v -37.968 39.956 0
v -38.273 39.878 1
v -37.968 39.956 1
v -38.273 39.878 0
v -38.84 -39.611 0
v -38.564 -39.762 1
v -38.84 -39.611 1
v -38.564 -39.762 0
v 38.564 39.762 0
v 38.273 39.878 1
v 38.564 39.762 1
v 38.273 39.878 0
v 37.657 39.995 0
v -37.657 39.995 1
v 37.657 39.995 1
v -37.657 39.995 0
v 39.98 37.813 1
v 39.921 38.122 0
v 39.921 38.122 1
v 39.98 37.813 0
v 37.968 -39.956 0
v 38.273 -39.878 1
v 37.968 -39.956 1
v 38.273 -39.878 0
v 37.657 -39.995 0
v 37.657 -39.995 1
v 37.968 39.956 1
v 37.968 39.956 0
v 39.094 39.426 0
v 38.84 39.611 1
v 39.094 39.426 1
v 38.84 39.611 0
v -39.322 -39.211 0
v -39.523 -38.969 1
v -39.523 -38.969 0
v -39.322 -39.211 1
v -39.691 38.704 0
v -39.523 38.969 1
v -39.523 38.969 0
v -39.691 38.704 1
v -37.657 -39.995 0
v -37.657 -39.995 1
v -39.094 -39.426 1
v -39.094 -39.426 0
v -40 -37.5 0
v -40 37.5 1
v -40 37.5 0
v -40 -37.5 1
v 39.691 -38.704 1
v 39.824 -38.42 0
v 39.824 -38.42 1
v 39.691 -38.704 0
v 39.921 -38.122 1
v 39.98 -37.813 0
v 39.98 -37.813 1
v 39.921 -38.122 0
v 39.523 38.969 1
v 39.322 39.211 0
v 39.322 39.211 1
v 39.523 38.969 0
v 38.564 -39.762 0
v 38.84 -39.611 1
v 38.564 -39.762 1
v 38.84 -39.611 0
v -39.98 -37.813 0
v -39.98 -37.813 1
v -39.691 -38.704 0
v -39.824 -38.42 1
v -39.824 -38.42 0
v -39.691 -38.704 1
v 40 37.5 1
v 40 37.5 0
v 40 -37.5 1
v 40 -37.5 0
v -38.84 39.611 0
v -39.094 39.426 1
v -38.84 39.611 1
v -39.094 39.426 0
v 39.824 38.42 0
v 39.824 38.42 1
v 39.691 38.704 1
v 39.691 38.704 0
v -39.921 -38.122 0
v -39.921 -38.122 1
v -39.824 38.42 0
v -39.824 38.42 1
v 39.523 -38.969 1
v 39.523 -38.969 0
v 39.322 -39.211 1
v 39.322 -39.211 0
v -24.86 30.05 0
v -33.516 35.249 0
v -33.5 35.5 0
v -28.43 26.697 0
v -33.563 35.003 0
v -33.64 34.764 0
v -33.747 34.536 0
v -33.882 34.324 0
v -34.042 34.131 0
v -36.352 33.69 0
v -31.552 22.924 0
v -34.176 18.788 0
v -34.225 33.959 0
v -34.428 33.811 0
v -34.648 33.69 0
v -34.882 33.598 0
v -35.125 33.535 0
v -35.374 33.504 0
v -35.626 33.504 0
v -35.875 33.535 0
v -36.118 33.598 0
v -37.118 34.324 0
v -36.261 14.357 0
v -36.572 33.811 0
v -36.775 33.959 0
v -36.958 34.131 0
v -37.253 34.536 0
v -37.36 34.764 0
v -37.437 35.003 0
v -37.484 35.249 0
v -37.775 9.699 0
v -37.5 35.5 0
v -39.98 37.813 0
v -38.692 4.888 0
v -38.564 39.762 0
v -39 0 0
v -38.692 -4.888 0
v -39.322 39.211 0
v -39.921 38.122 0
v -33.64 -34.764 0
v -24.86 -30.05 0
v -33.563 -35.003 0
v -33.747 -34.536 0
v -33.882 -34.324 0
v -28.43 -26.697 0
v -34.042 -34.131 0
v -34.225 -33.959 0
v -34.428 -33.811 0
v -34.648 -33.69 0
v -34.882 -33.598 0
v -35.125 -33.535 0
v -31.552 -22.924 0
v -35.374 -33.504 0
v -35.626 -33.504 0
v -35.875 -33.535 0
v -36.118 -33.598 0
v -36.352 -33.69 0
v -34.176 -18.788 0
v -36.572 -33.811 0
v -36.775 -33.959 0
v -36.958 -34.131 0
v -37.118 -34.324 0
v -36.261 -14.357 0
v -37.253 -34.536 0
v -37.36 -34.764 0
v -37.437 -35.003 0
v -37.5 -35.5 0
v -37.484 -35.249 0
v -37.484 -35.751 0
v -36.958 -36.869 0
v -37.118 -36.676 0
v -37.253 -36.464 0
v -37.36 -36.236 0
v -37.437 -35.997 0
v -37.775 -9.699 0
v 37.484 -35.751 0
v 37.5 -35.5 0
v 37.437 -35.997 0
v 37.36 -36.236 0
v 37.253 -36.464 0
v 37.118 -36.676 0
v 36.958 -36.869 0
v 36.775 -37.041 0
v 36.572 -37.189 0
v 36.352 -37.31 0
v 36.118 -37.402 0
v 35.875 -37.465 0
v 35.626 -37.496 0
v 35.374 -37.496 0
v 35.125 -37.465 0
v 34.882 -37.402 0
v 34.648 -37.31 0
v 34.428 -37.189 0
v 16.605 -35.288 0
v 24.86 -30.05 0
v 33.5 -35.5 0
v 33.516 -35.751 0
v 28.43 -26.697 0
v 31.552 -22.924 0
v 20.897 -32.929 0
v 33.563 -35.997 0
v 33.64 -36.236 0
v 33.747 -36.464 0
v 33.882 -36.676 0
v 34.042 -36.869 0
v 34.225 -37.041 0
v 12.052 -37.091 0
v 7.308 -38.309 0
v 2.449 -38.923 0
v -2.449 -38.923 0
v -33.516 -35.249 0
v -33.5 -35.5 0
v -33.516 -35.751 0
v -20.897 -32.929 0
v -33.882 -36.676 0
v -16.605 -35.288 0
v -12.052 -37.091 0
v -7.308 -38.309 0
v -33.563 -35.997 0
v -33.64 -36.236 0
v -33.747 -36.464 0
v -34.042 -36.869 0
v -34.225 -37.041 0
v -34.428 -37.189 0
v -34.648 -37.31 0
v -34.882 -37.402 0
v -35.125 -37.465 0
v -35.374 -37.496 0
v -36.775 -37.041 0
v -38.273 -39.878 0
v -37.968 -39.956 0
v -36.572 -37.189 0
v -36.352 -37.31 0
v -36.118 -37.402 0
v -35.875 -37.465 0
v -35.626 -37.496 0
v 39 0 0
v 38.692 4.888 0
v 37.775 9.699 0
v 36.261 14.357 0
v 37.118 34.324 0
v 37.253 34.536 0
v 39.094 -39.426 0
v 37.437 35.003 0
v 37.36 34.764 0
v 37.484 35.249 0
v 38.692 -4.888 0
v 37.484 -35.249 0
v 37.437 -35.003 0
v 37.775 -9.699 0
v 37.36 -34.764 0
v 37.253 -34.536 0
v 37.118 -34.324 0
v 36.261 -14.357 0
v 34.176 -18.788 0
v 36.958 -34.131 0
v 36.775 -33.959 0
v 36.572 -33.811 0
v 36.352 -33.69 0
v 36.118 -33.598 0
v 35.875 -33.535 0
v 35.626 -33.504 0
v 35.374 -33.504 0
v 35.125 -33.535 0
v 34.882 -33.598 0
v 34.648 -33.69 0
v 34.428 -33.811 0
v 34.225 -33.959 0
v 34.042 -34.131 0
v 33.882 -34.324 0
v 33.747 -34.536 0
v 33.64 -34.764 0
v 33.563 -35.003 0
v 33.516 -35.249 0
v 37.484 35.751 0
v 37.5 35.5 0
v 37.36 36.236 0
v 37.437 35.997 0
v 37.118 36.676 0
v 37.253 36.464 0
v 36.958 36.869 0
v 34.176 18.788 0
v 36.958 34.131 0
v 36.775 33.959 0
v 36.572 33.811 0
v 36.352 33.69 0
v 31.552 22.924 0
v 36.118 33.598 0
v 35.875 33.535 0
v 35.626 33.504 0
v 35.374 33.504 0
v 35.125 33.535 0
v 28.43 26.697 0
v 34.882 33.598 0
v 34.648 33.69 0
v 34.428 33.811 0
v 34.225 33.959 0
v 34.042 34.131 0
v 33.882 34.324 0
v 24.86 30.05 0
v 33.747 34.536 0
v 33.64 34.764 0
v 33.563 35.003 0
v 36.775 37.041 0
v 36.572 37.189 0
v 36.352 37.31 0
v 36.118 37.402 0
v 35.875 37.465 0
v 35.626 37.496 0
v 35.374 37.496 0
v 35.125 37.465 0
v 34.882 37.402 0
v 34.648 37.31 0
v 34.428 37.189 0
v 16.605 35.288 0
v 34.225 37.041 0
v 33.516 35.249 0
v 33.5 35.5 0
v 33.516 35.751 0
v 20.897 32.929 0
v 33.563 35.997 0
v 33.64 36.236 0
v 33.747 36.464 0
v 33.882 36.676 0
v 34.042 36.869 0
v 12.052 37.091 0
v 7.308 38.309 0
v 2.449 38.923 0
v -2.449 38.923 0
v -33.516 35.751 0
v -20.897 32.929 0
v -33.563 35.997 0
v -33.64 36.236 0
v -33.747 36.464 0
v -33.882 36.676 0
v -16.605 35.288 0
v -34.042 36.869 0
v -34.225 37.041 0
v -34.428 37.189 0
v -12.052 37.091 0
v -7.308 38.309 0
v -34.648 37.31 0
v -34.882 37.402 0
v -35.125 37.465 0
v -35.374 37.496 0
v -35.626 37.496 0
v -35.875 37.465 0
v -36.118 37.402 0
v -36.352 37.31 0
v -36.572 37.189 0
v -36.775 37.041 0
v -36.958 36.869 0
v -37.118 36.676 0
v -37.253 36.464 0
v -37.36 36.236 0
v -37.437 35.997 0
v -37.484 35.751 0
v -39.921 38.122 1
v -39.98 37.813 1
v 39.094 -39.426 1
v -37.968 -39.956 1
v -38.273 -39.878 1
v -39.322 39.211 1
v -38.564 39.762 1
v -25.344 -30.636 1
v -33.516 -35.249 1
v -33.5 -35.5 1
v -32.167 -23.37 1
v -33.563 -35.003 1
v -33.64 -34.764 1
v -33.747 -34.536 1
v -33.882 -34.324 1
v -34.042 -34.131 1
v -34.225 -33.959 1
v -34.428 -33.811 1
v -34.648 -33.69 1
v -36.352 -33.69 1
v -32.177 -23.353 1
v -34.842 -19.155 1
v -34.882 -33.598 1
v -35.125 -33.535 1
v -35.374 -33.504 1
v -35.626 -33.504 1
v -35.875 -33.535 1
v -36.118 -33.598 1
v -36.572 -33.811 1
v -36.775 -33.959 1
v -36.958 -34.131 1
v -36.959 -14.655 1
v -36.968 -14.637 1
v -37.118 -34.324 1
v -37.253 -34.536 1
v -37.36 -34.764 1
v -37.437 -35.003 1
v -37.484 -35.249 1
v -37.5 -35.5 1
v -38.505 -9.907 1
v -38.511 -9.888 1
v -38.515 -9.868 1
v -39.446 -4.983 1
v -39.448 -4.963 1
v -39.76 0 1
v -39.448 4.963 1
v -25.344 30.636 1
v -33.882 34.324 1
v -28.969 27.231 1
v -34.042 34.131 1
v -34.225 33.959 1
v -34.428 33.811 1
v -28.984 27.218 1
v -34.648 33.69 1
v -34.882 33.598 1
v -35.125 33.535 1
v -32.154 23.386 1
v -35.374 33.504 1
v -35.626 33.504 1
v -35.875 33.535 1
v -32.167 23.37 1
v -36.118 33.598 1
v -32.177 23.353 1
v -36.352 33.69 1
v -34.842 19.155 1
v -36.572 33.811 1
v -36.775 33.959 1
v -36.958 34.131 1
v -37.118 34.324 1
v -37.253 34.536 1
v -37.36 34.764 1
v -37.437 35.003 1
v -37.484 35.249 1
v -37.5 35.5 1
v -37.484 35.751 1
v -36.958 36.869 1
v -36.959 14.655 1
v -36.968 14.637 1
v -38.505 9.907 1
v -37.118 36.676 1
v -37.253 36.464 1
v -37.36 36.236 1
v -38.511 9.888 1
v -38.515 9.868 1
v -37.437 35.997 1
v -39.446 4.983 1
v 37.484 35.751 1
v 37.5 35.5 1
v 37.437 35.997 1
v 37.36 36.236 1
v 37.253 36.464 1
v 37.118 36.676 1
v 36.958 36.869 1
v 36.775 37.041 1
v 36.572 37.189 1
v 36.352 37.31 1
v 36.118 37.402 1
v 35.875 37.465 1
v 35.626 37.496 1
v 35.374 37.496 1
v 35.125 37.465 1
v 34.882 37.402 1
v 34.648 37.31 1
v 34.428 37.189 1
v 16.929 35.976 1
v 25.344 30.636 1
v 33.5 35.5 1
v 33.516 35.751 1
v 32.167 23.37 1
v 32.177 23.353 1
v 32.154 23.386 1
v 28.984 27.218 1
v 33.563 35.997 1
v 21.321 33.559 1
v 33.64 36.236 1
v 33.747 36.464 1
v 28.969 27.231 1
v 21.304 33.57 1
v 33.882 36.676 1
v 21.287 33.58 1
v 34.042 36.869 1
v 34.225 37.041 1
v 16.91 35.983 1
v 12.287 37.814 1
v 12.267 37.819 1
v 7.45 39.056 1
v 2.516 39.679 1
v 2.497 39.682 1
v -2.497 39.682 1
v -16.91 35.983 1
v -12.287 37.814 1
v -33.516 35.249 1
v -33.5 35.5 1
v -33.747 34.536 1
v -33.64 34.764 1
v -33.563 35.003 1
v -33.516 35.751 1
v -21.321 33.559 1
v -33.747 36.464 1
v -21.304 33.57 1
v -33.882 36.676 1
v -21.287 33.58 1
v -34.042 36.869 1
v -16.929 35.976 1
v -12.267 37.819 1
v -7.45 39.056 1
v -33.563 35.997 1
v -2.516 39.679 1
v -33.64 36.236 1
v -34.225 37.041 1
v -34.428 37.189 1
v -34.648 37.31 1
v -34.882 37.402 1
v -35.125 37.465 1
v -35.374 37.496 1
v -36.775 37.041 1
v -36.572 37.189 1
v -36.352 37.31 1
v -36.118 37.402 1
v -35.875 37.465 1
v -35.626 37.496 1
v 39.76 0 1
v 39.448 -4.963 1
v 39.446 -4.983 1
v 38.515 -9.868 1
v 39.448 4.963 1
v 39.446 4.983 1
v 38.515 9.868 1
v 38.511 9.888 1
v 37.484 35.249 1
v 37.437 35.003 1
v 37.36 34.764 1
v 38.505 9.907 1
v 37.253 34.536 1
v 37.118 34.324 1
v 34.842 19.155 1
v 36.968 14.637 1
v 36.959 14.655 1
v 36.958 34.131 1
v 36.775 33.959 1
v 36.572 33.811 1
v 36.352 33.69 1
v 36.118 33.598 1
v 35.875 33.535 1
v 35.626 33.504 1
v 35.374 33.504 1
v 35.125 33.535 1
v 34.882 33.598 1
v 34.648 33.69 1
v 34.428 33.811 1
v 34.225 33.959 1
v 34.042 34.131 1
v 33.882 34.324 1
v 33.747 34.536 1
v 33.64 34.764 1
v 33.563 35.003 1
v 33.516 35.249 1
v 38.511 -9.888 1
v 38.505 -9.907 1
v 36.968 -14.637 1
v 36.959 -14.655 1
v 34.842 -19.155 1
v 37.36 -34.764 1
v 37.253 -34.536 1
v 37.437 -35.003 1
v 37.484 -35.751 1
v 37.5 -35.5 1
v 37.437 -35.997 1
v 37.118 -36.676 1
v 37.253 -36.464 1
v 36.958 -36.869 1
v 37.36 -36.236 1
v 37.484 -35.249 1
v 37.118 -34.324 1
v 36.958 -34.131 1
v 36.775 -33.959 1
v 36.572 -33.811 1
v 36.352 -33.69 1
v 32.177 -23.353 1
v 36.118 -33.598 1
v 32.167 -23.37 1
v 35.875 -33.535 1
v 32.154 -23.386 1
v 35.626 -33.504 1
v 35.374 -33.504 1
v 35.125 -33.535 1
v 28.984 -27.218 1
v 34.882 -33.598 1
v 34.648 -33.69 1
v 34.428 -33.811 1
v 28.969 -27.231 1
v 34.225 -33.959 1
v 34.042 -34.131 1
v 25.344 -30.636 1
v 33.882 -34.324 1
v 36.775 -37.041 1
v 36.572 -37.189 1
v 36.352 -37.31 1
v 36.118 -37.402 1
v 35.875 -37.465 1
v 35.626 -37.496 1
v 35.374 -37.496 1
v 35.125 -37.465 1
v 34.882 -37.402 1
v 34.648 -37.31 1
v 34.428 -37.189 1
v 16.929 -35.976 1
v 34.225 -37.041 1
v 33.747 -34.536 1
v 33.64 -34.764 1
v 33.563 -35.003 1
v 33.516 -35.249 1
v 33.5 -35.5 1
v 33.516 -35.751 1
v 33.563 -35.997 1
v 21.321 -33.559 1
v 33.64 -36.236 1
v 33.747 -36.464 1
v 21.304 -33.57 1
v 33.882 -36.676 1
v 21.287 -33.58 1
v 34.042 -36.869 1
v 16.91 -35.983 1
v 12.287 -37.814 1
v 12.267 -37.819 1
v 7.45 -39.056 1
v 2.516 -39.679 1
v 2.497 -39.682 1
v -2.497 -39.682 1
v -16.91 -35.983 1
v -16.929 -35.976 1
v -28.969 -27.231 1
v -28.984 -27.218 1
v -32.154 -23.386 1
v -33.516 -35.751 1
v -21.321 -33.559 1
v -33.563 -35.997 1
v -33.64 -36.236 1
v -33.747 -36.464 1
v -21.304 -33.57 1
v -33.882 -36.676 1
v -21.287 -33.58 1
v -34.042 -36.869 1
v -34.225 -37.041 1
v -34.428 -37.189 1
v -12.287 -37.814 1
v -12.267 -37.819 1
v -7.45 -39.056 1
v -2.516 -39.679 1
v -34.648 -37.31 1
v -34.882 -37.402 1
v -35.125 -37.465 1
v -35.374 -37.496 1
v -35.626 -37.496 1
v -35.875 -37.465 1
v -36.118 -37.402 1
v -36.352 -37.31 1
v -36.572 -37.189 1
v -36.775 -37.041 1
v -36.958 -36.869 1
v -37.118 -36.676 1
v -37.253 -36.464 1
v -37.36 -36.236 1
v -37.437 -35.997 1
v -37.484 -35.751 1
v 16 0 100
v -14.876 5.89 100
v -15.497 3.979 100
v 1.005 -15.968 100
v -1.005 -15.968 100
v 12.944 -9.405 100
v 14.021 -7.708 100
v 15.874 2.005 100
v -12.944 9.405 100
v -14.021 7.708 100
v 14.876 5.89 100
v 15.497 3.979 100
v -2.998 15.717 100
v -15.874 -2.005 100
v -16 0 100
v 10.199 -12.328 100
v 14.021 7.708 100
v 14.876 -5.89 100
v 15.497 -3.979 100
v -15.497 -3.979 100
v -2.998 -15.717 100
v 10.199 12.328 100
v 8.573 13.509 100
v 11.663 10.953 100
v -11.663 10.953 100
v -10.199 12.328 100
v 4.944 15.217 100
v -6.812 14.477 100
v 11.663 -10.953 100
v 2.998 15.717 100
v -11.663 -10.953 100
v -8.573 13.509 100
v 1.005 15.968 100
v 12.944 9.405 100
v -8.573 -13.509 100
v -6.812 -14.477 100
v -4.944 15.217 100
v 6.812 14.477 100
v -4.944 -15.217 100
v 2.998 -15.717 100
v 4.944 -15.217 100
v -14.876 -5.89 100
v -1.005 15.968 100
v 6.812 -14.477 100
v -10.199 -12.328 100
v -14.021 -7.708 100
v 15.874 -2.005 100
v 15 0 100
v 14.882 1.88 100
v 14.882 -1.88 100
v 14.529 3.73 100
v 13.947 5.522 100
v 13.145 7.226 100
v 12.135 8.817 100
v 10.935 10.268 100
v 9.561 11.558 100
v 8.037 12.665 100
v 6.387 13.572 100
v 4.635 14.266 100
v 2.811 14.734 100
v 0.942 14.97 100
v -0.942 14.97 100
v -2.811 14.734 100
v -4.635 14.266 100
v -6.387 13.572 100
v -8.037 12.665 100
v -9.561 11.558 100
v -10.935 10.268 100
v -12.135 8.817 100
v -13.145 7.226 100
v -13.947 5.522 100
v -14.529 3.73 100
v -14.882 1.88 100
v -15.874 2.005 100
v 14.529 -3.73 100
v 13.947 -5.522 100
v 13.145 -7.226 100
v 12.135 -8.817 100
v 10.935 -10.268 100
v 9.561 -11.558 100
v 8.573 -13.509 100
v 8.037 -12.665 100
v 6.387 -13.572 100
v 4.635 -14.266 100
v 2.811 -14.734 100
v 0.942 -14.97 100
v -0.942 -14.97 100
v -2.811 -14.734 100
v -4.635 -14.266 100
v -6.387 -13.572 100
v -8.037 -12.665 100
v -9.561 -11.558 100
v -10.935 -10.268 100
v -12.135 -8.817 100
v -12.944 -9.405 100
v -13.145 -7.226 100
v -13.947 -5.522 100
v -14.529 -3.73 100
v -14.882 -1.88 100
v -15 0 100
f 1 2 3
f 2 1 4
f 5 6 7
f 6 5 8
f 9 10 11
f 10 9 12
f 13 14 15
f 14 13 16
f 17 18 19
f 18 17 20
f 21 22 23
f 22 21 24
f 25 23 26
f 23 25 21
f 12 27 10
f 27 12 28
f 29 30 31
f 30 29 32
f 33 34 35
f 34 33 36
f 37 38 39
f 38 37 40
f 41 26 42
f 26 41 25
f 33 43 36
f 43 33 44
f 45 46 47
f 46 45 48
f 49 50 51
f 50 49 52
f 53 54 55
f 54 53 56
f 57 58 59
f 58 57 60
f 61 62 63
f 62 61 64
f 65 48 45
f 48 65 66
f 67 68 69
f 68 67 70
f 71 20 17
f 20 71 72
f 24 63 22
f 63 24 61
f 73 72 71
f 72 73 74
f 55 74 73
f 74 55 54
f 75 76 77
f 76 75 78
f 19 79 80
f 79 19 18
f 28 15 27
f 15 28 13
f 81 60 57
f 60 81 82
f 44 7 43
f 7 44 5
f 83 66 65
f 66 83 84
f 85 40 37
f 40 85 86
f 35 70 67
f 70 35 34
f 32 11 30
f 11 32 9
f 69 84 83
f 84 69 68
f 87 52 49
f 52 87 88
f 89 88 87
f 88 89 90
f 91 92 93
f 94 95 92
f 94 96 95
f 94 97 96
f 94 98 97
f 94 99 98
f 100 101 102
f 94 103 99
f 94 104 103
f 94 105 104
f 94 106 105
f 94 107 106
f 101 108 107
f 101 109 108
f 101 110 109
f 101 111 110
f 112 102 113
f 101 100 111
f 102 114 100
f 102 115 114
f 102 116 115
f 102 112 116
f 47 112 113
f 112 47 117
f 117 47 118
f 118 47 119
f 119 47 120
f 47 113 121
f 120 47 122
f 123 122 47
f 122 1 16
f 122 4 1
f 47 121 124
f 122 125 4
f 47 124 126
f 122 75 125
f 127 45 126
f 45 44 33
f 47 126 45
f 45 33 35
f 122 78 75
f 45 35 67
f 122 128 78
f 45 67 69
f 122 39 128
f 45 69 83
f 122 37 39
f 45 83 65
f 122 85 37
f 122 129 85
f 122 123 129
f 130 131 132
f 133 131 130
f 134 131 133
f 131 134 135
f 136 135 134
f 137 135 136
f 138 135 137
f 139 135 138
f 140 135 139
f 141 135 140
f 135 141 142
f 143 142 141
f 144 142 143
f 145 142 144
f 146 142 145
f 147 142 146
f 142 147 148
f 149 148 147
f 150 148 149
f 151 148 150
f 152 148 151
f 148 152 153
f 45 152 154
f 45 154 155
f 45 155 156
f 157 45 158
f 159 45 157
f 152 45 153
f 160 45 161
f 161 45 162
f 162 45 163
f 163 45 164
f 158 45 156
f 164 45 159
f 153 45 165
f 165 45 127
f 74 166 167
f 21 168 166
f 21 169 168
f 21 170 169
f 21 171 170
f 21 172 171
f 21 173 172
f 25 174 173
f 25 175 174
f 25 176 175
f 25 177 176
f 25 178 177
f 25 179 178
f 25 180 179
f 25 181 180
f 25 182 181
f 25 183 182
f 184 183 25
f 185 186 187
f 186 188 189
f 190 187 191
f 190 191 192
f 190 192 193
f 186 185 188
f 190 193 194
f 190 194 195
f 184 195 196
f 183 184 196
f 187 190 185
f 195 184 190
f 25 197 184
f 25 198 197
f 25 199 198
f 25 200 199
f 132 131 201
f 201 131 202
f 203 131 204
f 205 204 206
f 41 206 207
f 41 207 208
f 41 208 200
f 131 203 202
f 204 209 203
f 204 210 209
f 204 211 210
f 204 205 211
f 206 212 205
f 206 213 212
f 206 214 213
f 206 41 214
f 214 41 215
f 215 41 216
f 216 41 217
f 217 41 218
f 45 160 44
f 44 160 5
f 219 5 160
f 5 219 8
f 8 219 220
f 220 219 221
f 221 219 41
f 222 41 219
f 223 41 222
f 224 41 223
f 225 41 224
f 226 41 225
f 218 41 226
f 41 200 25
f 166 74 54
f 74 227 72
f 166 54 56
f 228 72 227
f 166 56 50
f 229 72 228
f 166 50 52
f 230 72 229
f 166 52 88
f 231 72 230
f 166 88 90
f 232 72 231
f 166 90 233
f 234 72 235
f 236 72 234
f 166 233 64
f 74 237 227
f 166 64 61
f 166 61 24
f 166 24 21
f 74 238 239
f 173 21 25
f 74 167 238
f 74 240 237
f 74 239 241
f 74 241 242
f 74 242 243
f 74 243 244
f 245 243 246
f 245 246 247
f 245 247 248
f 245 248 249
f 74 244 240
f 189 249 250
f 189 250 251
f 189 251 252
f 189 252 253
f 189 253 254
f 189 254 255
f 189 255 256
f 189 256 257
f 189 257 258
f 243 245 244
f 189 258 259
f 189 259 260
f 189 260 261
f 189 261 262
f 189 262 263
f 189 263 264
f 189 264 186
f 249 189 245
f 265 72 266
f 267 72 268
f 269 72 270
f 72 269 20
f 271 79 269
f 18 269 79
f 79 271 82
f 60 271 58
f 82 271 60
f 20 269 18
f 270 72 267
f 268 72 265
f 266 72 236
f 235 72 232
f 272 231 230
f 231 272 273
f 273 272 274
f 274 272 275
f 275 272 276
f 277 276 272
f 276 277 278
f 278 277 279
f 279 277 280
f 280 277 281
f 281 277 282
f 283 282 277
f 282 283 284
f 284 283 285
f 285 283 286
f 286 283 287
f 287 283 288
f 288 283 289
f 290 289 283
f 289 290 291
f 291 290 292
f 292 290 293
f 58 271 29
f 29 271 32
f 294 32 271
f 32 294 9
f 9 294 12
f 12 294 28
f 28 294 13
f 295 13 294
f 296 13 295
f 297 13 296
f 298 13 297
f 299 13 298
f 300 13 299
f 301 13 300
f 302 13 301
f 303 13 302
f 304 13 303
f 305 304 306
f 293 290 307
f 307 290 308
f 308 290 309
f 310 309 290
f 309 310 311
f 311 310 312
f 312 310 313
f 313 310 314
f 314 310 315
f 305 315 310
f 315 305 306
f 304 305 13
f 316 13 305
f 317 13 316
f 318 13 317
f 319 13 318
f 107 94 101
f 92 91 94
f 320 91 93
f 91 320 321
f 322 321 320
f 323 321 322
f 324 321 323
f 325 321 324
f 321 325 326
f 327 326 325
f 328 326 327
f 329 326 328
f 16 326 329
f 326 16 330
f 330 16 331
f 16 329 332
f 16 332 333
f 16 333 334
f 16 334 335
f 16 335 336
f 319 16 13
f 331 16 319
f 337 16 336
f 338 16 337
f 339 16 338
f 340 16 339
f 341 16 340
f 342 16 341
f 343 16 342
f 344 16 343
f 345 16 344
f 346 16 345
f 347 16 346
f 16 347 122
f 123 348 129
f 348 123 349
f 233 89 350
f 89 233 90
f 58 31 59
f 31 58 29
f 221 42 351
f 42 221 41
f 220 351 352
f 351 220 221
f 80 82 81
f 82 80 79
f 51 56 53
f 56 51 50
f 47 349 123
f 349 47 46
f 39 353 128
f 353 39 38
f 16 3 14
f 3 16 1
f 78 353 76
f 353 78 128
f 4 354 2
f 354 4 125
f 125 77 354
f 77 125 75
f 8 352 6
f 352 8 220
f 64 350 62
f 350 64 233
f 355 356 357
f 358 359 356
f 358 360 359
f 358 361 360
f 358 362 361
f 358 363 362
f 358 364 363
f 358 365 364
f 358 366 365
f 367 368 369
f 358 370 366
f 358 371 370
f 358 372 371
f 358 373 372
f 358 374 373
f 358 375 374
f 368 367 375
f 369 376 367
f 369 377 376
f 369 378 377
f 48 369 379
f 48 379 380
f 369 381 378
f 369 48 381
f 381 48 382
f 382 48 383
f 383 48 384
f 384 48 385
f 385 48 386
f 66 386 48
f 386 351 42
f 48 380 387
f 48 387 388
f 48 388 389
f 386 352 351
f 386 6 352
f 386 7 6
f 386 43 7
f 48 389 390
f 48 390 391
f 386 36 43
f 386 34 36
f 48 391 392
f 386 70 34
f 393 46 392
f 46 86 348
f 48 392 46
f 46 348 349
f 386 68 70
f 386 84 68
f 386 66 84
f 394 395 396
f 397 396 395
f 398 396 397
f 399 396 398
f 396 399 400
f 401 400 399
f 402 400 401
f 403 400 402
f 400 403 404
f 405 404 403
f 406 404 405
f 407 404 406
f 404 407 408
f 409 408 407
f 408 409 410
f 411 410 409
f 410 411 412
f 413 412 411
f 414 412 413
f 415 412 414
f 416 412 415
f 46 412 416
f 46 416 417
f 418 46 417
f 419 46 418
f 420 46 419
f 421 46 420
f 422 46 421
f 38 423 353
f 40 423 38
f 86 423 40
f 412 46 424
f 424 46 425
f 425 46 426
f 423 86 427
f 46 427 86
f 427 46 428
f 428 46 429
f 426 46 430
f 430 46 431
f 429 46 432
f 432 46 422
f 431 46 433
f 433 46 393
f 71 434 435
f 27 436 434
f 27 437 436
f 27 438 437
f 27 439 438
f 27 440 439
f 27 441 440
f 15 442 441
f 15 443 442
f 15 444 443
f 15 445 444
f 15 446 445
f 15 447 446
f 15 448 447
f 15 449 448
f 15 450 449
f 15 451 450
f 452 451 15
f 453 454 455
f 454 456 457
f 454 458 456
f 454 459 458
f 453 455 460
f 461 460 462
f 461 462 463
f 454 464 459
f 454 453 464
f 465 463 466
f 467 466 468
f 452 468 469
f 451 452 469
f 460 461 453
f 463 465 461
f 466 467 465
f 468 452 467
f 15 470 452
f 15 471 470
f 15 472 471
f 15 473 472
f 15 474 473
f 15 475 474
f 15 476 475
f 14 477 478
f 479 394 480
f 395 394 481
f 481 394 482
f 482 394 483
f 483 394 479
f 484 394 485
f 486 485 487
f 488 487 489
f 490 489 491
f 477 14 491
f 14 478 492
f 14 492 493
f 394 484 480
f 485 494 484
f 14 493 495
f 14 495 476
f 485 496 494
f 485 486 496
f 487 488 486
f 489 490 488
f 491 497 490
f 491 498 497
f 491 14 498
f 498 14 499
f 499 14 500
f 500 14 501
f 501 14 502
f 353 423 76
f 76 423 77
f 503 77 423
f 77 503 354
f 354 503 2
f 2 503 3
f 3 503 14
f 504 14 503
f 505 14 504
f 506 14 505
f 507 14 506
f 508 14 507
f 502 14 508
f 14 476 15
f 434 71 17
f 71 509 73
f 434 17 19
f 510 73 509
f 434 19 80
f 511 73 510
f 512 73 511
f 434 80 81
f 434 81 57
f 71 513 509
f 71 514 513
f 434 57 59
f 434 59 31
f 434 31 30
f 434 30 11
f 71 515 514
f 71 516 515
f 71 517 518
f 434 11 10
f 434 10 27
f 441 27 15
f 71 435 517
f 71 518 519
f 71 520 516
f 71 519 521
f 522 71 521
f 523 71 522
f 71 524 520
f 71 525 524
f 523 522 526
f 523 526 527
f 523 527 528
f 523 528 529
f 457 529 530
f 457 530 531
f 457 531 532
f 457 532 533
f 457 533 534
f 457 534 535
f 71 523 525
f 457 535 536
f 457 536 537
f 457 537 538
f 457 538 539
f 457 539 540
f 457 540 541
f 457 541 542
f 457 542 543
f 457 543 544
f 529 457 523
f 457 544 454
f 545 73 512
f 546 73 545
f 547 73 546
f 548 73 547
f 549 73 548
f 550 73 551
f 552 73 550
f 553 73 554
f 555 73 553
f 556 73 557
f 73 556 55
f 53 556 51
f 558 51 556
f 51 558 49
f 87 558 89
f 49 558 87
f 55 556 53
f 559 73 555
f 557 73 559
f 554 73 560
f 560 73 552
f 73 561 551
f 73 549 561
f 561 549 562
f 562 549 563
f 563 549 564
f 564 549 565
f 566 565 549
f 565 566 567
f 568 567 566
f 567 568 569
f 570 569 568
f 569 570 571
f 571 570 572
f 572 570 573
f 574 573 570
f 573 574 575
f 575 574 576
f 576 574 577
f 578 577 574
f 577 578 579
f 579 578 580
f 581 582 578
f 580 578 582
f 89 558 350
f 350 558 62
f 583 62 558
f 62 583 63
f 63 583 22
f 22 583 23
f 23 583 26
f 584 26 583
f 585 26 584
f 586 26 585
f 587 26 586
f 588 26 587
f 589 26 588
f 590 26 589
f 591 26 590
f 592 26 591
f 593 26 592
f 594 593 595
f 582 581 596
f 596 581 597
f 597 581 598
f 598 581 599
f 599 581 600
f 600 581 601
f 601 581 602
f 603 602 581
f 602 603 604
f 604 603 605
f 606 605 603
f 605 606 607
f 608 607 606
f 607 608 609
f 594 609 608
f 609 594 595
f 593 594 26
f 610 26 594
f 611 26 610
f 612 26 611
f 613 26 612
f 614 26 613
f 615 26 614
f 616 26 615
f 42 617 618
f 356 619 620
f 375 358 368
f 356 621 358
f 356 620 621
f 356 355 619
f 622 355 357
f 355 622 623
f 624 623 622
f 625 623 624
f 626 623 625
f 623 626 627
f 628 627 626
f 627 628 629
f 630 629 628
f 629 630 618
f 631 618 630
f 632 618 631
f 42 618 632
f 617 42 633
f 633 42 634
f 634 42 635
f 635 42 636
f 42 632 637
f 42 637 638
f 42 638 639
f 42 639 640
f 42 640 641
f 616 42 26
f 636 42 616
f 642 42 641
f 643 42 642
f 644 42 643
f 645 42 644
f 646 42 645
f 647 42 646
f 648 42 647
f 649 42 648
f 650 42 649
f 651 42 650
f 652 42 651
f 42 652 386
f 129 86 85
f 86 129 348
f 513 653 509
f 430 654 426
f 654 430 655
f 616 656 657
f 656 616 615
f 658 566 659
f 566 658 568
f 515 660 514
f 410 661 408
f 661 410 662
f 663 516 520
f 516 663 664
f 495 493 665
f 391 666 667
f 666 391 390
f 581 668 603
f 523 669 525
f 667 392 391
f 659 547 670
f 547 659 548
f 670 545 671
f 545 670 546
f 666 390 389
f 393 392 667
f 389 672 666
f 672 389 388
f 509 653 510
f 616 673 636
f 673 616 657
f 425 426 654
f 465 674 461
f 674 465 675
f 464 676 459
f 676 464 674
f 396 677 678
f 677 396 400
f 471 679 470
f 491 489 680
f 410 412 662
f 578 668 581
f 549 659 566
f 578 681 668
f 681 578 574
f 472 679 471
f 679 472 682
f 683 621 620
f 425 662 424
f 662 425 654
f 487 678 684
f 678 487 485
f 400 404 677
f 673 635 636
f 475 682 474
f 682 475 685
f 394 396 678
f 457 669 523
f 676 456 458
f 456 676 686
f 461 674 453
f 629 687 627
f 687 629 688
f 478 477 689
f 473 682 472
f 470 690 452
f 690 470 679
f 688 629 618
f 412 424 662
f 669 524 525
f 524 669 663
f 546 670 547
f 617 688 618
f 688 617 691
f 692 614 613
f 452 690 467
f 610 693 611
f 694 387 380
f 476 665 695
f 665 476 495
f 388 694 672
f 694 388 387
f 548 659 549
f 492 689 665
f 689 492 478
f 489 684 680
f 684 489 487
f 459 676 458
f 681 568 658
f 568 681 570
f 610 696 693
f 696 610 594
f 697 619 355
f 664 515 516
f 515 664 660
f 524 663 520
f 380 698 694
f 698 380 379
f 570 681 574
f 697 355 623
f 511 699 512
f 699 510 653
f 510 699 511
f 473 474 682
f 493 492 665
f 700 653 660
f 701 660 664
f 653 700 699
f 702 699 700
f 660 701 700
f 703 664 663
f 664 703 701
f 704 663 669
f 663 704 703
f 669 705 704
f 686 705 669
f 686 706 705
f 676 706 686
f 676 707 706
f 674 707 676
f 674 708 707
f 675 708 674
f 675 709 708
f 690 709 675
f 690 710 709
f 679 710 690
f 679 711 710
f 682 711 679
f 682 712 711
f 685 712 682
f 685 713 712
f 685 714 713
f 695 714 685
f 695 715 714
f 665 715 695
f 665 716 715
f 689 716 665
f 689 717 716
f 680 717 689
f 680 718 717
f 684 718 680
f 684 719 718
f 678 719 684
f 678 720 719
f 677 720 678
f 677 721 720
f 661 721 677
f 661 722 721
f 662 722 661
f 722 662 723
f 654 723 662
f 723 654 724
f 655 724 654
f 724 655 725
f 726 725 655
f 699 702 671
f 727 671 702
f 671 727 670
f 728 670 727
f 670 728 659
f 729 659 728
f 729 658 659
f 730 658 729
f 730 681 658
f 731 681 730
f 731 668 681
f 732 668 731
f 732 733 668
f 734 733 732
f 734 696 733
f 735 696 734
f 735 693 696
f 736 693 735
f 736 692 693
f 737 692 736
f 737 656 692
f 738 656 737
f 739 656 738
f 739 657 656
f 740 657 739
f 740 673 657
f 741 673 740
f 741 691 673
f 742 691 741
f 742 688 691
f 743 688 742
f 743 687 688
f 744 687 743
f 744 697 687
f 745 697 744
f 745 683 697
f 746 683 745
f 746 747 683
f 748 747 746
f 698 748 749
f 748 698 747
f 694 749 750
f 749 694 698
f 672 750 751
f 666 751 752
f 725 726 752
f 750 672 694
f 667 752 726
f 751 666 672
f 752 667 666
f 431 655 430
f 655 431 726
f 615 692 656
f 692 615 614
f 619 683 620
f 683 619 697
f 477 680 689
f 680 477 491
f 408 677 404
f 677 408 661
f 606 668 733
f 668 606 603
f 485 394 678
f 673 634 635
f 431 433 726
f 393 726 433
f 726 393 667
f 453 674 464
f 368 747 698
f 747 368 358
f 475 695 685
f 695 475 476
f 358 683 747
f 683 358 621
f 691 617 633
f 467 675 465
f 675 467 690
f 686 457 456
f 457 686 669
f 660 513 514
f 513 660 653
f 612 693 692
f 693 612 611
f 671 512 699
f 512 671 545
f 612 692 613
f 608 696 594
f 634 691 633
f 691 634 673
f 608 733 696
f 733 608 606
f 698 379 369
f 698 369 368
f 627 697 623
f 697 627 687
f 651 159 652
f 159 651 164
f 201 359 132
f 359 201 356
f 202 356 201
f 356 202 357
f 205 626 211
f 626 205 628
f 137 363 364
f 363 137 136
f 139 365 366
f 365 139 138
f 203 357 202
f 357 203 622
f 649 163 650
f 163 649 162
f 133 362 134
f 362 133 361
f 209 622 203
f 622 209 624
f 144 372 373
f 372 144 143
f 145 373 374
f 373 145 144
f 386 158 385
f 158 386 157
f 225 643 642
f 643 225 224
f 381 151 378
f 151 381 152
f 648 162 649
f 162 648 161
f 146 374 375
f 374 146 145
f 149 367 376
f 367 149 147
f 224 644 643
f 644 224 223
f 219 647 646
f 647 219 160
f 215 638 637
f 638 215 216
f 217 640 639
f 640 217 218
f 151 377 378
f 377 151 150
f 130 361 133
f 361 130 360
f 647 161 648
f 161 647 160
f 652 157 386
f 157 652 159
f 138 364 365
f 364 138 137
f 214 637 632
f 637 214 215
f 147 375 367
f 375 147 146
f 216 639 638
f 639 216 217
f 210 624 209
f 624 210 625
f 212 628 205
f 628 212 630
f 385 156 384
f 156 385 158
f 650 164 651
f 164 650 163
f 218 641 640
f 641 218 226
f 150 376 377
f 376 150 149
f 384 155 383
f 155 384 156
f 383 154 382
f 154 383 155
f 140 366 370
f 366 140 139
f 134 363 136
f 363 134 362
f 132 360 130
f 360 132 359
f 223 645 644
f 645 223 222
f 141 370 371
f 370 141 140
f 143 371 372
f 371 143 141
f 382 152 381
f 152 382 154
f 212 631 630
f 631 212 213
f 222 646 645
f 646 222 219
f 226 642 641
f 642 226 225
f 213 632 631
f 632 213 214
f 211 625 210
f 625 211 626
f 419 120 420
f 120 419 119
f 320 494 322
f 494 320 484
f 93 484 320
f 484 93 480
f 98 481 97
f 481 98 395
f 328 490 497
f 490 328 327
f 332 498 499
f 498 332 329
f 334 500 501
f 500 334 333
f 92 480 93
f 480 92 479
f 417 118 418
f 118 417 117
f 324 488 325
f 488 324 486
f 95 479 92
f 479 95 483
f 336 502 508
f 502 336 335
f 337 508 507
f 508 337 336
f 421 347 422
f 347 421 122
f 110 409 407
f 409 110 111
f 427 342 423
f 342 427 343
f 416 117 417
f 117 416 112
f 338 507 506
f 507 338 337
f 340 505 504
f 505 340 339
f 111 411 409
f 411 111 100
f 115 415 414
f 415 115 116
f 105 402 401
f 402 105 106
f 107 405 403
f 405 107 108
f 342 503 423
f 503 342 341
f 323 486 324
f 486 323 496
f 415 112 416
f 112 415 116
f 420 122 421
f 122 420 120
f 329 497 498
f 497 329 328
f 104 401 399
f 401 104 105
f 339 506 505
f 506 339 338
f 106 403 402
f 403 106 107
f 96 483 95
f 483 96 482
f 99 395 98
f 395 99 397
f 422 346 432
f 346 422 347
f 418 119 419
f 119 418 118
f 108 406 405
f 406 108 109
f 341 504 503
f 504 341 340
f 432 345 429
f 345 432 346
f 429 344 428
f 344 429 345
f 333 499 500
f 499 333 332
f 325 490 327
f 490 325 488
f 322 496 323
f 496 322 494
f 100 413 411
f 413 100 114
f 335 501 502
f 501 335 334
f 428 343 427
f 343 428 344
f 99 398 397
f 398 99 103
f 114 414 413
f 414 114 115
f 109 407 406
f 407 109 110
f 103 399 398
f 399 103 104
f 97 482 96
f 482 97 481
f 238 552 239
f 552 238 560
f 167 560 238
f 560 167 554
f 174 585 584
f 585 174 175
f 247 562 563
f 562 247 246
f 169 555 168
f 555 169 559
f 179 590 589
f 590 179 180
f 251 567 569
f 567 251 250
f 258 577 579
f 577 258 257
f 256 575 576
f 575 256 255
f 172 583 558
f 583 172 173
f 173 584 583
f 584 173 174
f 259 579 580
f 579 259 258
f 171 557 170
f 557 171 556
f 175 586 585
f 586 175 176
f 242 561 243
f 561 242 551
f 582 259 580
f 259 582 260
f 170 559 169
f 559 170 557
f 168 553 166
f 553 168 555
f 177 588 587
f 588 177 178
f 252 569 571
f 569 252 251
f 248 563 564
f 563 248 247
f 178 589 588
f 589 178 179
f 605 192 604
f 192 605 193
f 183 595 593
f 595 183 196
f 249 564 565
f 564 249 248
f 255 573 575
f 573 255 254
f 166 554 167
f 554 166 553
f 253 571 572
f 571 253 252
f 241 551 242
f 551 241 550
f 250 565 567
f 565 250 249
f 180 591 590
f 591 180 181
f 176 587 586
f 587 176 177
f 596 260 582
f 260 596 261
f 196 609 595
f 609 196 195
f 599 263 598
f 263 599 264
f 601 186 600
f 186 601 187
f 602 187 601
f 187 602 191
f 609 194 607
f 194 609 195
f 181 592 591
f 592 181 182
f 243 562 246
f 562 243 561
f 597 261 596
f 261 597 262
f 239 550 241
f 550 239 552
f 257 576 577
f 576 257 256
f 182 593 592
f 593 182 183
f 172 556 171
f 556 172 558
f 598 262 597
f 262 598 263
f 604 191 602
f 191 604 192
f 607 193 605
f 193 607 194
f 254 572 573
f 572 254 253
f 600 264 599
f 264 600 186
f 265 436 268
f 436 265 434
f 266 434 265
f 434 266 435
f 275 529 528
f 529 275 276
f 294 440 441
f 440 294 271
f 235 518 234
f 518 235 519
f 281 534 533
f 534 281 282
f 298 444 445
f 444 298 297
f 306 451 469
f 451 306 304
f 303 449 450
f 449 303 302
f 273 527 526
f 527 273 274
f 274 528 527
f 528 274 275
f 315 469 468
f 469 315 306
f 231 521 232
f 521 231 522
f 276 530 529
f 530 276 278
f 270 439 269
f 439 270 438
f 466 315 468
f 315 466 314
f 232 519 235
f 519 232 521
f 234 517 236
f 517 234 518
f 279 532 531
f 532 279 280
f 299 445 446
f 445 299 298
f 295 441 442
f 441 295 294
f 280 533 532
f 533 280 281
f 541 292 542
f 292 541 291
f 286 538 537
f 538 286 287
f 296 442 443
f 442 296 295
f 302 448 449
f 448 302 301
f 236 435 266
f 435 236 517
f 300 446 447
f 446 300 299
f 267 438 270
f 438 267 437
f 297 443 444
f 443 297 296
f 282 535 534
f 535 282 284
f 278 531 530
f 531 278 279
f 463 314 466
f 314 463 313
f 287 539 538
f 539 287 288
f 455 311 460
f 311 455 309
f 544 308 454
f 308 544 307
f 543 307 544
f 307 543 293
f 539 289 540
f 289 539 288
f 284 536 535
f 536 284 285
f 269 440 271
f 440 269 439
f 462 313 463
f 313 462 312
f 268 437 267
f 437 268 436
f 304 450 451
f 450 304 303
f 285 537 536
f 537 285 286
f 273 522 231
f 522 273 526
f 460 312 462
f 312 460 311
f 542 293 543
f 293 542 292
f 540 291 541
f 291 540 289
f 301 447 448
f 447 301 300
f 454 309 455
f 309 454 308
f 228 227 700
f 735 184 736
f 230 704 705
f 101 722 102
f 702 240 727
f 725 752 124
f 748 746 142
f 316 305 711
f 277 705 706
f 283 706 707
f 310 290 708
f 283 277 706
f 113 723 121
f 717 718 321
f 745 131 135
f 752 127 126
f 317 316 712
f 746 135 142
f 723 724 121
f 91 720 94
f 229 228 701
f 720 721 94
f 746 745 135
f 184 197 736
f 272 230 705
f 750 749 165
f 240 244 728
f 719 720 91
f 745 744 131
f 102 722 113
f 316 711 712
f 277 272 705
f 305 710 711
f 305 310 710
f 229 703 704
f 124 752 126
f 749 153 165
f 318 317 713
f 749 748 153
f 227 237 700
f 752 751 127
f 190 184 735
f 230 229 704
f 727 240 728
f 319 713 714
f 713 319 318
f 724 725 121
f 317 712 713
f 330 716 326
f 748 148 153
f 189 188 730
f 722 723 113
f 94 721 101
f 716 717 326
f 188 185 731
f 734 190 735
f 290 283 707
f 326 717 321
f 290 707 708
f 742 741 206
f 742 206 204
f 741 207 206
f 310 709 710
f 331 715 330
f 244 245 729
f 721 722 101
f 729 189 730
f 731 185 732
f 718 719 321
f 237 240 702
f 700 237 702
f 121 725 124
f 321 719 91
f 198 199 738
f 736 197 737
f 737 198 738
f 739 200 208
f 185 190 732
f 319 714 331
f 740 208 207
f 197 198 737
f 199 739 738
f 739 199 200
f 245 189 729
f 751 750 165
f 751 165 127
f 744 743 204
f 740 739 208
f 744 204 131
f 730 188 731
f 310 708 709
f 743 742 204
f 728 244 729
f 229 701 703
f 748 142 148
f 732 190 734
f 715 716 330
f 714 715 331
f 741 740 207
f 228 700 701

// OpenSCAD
WIDTH = 80;
THICKNESS = 1;
HEIGHT = 100;
FAN_DIA = WIDTH - 2 * THICKNESS;
FAN_MOUNT_HOLE_SPACING = 71;
FAN_MOUNT_HOLE_DIA = 4;
OUTLET_DIA = 30;
CORNER_DIA = 5;

$fn = 50;

module mounting_holes(spacing, thickness, dia) {
    for(i = [-1, 1]) {
        for(j = [-1, 1]) {
            translate([i * spacing/2, j * spacing/2, 0])
            cylinder(d = dia, h = thickness);
        }
    }
}

module rounded_square(width, thickness, corner_dia) {
    hull() {
        mounting_holes(width - corner_dia, thickness, corner_dia);
    }
}

difference() {
    union() {
        rounded_square(WIDTH, THICKNESS, CORNER_DIA);
        cylinder(d1 = WIDTH, d2 = OUTLET_DIA + 2 * THICKNESS, h = HEIGHT);
    }
    mounting_holes(FAN_MOUNT_HOLE_SPACING, THICKNESS, FAN_MOUNT_HOLE_DIA);
    cylinder(d1 = FAN_DIA, d2 = OUTLET_DIA, h = HEIGHT);
}
